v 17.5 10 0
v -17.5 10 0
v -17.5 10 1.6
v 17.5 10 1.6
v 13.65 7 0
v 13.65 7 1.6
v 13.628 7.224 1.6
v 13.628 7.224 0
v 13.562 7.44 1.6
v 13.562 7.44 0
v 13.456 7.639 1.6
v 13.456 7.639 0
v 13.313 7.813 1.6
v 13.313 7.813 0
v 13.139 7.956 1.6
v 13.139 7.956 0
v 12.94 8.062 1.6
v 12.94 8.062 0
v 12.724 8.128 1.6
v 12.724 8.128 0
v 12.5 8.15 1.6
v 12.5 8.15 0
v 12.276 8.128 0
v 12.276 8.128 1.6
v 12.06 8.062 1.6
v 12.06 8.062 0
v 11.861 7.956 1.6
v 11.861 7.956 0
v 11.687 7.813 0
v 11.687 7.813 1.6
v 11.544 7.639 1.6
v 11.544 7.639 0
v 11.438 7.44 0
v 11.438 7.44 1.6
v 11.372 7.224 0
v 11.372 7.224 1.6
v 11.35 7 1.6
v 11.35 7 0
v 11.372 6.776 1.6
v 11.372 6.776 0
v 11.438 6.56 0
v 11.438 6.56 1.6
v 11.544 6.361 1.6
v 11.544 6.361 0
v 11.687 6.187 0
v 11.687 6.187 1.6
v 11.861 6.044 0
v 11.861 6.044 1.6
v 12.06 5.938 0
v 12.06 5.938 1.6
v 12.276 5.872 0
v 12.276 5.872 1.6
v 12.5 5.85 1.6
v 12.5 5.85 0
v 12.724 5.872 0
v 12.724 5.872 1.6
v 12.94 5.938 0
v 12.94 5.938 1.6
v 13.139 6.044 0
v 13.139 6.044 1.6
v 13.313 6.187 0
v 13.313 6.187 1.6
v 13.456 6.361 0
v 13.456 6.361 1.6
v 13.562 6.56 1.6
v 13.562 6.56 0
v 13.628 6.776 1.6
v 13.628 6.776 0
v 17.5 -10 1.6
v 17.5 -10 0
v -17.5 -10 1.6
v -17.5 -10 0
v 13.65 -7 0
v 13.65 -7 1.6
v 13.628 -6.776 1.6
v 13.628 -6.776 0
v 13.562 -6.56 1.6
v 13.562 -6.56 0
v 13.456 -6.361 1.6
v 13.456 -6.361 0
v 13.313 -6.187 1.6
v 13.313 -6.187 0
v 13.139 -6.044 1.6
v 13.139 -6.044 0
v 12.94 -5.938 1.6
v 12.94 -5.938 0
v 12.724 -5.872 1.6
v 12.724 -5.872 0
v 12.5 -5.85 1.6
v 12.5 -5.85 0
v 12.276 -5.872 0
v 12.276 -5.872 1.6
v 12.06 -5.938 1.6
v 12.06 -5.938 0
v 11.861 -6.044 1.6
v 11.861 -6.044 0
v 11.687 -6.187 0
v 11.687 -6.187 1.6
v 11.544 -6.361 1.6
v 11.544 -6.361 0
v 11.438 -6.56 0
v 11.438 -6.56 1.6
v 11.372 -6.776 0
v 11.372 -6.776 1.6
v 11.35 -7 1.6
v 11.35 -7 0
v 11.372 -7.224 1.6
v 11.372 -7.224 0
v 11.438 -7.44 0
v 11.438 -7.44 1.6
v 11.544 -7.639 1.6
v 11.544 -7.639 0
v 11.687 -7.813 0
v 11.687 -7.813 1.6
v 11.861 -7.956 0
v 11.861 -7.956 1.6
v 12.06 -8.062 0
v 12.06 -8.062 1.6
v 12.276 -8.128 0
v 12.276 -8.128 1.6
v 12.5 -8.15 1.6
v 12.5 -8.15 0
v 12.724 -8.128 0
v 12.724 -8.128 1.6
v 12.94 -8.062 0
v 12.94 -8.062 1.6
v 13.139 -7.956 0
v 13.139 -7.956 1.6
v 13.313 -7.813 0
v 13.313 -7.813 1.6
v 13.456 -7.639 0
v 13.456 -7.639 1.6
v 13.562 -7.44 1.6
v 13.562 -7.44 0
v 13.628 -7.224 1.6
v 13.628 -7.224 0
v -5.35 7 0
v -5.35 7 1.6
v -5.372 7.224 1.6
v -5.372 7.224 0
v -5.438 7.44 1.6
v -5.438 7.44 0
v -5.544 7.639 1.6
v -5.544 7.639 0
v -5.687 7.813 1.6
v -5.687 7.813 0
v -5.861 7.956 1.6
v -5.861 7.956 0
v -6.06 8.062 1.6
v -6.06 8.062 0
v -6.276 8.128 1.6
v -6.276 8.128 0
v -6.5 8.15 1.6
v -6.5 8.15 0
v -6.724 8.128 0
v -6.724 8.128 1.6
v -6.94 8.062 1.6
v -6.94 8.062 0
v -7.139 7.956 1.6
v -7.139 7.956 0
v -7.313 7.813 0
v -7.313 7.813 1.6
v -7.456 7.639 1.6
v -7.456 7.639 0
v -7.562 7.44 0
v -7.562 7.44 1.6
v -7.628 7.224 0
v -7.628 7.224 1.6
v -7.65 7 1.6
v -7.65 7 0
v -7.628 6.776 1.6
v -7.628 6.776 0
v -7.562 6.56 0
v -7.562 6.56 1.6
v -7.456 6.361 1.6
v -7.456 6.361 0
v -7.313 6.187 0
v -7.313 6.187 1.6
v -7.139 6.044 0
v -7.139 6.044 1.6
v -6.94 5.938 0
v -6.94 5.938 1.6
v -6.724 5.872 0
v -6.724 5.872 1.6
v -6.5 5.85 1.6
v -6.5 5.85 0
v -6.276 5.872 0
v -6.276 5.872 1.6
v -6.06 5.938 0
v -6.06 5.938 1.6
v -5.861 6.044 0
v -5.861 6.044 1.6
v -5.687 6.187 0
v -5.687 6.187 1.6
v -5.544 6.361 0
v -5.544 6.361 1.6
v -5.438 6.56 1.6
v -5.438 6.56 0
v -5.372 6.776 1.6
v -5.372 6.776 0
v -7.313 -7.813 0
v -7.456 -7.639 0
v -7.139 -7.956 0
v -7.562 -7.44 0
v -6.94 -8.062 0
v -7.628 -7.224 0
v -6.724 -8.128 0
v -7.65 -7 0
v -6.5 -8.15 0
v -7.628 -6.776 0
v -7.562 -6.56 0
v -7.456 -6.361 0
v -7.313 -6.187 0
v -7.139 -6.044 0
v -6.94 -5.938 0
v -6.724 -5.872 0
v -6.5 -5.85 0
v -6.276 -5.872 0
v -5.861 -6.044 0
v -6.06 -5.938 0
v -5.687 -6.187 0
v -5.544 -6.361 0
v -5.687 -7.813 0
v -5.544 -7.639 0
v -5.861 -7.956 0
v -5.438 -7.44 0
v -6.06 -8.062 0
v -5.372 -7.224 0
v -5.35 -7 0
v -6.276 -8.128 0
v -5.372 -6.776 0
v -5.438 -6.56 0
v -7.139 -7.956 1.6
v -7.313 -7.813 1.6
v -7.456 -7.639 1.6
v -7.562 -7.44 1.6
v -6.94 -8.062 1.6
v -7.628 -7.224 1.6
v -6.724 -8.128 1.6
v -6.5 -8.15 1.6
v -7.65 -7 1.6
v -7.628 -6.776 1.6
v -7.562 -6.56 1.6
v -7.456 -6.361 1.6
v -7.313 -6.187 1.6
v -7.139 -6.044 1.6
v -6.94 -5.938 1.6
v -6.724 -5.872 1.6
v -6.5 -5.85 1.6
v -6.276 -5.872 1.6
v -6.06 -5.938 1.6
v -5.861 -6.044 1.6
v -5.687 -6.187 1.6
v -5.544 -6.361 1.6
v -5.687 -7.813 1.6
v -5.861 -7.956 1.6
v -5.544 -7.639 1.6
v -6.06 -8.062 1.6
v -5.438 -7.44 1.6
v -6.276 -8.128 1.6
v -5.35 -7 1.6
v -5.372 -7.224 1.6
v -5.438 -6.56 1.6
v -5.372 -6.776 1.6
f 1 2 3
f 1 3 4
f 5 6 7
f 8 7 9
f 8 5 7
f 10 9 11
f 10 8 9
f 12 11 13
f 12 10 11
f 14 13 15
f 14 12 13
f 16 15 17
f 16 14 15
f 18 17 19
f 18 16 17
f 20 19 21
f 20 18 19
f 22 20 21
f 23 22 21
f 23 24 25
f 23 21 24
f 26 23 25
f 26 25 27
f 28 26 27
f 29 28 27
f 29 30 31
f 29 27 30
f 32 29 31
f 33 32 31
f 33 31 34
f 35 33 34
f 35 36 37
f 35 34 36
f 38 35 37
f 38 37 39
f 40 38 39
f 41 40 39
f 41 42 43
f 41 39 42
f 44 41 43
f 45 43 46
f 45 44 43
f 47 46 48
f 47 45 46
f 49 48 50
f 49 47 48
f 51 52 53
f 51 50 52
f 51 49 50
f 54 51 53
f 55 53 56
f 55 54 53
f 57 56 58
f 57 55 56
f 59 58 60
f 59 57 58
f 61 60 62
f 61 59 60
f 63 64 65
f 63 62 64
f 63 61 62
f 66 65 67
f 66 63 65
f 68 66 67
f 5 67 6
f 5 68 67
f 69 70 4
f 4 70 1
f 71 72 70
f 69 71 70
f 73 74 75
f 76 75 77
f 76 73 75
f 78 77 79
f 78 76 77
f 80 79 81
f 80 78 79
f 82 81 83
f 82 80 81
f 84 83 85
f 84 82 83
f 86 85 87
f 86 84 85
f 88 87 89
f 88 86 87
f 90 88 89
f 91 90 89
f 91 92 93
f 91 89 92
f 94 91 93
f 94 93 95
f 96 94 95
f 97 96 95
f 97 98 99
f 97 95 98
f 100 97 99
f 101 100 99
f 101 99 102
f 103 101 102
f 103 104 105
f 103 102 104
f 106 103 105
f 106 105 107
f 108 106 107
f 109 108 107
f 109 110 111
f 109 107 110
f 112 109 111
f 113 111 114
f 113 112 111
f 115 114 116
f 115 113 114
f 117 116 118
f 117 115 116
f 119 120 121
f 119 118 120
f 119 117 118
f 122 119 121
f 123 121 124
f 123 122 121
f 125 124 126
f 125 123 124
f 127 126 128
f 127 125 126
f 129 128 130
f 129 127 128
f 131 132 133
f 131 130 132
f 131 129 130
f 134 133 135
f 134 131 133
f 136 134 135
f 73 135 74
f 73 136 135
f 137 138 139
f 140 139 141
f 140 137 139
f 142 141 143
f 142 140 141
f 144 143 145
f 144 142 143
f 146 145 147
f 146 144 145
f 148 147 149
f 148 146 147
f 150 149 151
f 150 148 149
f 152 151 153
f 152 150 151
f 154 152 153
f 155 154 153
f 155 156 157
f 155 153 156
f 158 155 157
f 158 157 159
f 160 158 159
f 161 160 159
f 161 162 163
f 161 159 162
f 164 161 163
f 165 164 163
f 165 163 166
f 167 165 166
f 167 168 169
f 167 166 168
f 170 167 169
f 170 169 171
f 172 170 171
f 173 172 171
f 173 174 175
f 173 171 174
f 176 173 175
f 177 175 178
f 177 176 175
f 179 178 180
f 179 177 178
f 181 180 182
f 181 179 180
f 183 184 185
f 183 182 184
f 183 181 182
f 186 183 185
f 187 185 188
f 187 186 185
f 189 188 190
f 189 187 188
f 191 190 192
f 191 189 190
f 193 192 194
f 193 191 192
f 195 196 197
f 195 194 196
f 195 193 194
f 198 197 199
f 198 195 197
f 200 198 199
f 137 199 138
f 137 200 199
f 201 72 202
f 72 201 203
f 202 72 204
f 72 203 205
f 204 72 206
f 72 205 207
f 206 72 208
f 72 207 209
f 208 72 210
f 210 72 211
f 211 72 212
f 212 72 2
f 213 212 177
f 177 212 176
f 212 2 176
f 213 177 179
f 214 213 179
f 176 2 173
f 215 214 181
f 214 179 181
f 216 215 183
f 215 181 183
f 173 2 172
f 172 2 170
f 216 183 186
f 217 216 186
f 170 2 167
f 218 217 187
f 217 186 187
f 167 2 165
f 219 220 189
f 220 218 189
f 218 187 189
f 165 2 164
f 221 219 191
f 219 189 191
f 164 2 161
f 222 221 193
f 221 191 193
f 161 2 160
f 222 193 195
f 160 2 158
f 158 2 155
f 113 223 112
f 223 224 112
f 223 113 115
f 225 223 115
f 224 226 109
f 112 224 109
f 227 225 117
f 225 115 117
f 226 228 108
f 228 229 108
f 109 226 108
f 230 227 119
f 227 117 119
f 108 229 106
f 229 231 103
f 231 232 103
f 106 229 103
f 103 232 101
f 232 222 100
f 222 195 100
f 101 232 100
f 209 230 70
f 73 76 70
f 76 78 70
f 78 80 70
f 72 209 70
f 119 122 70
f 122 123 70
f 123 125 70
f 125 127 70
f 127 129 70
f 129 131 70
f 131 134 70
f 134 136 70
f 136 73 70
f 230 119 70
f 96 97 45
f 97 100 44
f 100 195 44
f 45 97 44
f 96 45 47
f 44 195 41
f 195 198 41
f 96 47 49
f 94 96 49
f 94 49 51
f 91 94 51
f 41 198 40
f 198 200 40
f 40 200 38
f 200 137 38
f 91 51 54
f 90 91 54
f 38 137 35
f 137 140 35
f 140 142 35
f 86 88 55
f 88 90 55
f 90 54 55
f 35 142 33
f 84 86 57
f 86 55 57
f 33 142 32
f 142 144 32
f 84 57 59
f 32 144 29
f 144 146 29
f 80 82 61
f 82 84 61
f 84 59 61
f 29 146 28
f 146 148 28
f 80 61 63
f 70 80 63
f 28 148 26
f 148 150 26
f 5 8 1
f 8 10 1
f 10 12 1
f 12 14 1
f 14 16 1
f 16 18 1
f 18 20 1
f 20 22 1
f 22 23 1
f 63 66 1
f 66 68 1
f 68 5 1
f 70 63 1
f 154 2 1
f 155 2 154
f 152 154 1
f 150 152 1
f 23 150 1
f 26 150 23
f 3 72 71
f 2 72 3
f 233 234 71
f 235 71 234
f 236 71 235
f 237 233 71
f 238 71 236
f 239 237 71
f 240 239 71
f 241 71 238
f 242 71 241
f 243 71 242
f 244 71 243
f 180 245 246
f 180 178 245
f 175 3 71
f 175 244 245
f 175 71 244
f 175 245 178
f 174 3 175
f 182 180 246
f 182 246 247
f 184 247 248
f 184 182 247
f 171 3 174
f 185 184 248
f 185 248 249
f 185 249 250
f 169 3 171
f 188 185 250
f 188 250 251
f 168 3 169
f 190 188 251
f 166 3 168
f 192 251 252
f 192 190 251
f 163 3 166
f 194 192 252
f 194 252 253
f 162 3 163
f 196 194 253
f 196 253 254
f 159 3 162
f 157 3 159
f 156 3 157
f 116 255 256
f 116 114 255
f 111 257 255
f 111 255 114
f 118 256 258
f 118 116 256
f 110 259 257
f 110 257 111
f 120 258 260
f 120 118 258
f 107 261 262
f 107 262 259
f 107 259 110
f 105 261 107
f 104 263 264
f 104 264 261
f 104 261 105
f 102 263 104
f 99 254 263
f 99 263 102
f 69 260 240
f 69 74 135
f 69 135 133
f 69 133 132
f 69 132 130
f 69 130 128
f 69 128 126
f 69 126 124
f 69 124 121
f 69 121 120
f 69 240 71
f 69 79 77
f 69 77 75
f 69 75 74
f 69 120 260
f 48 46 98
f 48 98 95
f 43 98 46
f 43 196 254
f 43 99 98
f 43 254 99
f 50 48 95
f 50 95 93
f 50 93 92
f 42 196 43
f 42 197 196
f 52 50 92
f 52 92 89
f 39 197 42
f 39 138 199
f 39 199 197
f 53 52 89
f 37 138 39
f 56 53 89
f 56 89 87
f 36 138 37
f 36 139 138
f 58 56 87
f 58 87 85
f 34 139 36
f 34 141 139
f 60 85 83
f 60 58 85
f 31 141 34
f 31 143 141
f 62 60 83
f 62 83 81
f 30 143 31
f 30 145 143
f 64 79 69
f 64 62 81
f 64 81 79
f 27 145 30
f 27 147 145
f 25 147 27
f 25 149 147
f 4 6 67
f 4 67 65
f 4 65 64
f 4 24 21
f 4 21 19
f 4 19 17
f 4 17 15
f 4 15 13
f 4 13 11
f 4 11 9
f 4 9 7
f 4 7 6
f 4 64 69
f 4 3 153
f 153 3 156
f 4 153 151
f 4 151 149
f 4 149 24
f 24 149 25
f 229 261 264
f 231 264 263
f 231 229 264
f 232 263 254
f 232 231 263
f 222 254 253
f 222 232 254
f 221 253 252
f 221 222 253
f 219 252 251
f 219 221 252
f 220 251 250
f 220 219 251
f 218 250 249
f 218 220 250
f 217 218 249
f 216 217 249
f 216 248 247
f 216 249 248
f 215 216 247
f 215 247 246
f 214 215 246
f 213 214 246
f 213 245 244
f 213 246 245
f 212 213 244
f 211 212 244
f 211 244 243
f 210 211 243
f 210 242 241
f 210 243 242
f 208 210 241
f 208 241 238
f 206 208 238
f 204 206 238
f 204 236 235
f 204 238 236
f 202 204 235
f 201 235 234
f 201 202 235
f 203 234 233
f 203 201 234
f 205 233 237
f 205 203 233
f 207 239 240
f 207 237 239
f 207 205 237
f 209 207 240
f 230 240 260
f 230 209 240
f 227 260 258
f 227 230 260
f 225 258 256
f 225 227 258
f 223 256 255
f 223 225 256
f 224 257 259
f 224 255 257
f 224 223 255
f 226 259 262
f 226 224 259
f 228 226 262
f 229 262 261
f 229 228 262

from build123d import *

# Parameters (mm, degrees)
SKETCH1_W   = 35
SKETCH1_H   = 20
PCB_DEPTH   = 1.6
HOLES_REACH = 22.219
SKETCH2_R   = 1.15


with BuildPart() as part:
    # Sketch1 → PCB (new body)
    with BuildSketch(Plane.XY):
        Rectangle(SKETCH1_W, SKETCH1_H)
    extrude(amount=PCB_DEPTH)

    # Sketch2 → Holes (cut, up to next)
    with BuildSketch(Plane.XY, mode=Mode.PRIVATE) as holes_sk1:
        with Locations((12.5, 7)):
            Circle(SKETCH2_R)
    holes_tool1 = extrude(holes_sk1.sketch, amount=HOLES_REACH, mode=Mode.PRIVATE) & part.part
    # Sketch2 → Holes (cut, up to next)
    with BuildSketch(Plane.XY, mode=Mode.PRIVATE) as holes_sk2:
        with Locations((-6.5, 7)):
            Circle(SKETCH2_R)
    holes_tool2 = extrude(holes_sk2.sketch, amount=HOLES_REACH, mode=Mode.PRIVATE) & part.part
    # Sketch2 → Holes (cut, up to next)
    with BuildSketch(Plane.XY, mode=Mode.PRIVATE) as holes_sk3:
        with Locations((-6.5, -7)):
            Circle(SKETCH2_R)
    holes_tool3 = extrude(holes_sk3.sketch, amount=HOLES_REACH, mode=Mode.PRIVATE) & part.part
    # Sketch2 → Holes (cut, up to next)
    with BuildSketch(Plane.XY, mode=Mode.PRIVATE) as holes_sk4:
        with Locations((12.5, -7)):
            Circle(SKETCH2_R)
    holes_tool4 = extrude(holes_sk4.sketch, amount=HOLES_REACH, mode=Mode.PRIVATE) & part.part
    add(holes_tool1.solids().sort_by_distance((12.5, 7, 0))[0], mode=Mode.SUBTRACT)
    add(holes_tool2.solids().sort_by_distance((-6.5, 7, 0))[0], mode=Mode.SUBTRACT)
    add(holes_tool3.solids().sort_by_distance((-6.5, -7, 0))[0], mode=Mode.SUBTRACT)
    add(holes_tool4.solids().sort_by_distance((12.5, -7, 0))[0], mode=Mode.SUBTRACT)


solid = part.part
